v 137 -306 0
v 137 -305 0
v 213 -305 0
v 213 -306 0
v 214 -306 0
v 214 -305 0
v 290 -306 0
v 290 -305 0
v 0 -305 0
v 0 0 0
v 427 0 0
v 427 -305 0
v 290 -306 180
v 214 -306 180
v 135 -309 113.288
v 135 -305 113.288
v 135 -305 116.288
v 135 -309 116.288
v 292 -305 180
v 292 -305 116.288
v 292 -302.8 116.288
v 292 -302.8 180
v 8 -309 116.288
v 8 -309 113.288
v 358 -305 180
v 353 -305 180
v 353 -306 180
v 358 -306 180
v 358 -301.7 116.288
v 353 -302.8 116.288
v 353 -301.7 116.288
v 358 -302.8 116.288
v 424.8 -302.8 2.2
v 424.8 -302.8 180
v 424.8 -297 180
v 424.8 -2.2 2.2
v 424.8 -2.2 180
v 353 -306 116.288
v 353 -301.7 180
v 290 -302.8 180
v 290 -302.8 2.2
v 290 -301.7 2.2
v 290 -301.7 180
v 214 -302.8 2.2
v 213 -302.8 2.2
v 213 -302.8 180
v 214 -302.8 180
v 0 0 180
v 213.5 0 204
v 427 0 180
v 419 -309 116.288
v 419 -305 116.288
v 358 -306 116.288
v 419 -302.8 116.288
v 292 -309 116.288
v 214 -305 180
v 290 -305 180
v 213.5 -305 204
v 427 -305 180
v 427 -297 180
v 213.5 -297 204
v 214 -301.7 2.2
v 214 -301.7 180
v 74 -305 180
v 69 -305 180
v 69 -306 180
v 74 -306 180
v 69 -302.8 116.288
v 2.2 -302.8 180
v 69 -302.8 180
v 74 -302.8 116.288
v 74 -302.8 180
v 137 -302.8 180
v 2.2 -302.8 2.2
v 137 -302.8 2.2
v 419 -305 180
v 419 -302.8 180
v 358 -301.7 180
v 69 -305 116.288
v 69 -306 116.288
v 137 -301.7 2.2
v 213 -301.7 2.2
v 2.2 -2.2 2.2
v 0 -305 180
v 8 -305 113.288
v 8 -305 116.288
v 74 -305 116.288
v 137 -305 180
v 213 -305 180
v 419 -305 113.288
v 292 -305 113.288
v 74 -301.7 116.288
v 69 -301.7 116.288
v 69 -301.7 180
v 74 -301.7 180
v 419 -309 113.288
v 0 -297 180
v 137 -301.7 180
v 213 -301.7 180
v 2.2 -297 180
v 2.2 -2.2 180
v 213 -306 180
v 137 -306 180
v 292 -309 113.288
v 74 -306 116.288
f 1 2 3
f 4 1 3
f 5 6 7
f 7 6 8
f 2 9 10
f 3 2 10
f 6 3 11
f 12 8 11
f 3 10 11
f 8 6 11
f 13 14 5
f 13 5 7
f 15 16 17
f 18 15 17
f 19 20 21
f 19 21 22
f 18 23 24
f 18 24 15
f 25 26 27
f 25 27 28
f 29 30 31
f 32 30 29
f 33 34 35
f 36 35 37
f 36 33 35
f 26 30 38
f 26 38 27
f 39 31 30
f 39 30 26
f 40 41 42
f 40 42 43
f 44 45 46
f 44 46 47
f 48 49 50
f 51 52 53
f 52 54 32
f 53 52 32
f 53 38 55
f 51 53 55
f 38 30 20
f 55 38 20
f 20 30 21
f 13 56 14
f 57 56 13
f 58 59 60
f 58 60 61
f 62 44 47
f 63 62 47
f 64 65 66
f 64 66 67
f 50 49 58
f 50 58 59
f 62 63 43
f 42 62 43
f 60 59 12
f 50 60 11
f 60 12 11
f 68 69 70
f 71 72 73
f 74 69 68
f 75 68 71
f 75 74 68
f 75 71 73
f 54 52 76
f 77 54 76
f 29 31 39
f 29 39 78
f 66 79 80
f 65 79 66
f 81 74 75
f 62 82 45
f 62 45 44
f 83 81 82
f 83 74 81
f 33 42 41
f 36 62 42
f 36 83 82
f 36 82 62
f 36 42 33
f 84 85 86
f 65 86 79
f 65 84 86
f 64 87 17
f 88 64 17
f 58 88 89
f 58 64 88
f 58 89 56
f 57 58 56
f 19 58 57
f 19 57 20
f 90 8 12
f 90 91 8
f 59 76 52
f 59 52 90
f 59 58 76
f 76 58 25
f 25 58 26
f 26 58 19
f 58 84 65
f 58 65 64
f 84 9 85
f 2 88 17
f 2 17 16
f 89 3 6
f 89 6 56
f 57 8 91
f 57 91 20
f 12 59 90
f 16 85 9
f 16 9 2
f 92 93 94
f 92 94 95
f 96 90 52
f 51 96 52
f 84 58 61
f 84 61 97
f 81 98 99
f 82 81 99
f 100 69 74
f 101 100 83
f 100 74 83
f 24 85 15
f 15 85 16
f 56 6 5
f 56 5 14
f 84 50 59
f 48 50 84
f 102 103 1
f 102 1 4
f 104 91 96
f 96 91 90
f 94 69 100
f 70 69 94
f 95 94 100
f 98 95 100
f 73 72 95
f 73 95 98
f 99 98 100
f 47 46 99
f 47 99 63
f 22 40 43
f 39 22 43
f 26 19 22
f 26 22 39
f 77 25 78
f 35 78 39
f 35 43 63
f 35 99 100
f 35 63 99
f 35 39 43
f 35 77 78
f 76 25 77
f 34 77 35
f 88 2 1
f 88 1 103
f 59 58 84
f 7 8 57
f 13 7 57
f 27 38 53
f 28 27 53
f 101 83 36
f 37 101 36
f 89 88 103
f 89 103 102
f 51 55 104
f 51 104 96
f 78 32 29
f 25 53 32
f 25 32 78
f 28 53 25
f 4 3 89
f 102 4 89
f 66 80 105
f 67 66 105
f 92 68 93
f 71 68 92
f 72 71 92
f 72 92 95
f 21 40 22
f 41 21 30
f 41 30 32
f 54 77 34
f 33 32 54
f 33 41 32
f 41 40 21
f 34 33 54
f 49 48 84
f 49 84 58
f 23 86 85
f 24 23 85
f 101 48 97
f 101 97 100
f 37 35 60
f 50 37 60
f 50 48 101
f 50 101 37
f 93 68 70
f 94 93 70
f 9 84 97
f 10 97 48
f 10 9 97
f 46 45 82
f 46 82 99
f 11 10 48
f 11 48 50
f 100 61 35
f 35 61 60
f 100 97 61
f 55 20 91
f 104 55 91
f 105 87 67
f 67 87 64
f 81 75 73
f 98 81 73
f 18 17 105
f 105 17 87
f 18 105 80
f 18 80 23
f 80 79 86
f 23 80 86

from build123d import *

# Parameters (mm, degrees)
F0_W          = 427
F0_H          = 305
F0_W_2        = 422.6
F0_H_2        = 300.6
F1_DEPTH      = 180
F2_DEPTH      = 2.2
F3_W          = 76
F3_H          = 180
F3_W_2        = 5
F3_H_2        = 63.7124854326
F4_DEPTH      = 1
F4_DEPTH_BACK = 3.3
F3_W_3        = 61
F5_DEPTH      = 25
F6_DEPTH      = 8
F7_DEPTH      = 4
F9_DEPTH      = 305


# Not quite as in the source:
# - a feature names something its author has since deleted; it is built from what else it names
# - the program builds the solid bodies; features that only make, move or delete a surface that nothing else refers to are left out


with BuildPart() as f1:
    # F0 (on Top) → F1 (new body)
    with BuildSketch(Plane.XY):
        with Locations((213.5, -152.5)):
            Rectangle(F0_W, F0_H)
        with Locations((213.5, -152.5)):
            Rectangle(F0_W_2, F0_H_2, mode=Mode.SUBTRACT)
    extrude(amount=F1_DEPTH)

    # F0 (on Top) → F2 (join)
    with BuildSketch(Plane.XY):
        with Locations((213.5, -152.5)):
            Rectangle(F0_W_2, F0_H_2)
    extrude(amount=F2_DEPTH)

    # F3 (on face) → F4 (join, two sides)
    with BuildSketch(Plane.XZ.offset(305)) as f4_sk:
        with Locations((175, 90)):
            Rectangle(F3_W, F3_H)
        with Locations((252, 90)):
            Rectangle(F3_W, F3_H)
        with Locations((71.5, 148.1437572837)):
            Rectangle(F3_W_2, F3_H_2)
        with Locations((355.5, 148.1437572837)):
            Rectangle(F3_W_2, F3_H_2)
    extrude(amount=F4_DEPTH)
    extrude(f4_sk.sketch, amount=-F4_DEPTH_BACK)

    # F3 (on face) → F5 (cut)
    with BuildSketch(Plane.XZ.offset(305)):
        Polygon((135, 180), (137, 180), (213, 180), (214, 180), (290, 180), (292, 180), (353, 180), (358, 180), (419, 180), (427, 180), (213.5, 204), (0, 180), (8, 180), (69, 180), (74, 180), align=None)
        with Locations((322.5, 148.1437572837)):
            Rectangle(F3_W_3, F3_H_2)
        with Locations((388.5, 148.1437572837)):
            Rectangle(F3_W_3, F3_H_2)
    extrude(amount=-F5_DEPTH, mode=Mode.SUBTRACT)

    # F3 (on face) → F6 (join)
    with BuildSketch(Plane.XZ.offset(305)):
        Polygon((135, 180), (137, 180), (213, 180), (214, 180), (290, 180), (292, 180), (353, 180), (358, 180), (419, 180), (427, 180), (213.5, 204), (0, 180), (8, 180), (69, 180), (74, 180), align=None)
    extrude(amount=-F6_DEPTH)

    # F3 (on face) → F7 (join)
    with BuildSketch(Plane.XZ.offset(305)):
        Polygon((353, 116.2875145674), (292, 116.2875145674), (292, 113.2875145674), (419, 113.2875145674), (419, 116.2875145674), (358, 116.2875145674), align=None)
        Polygon((135, 113.2875145674), (135, 116.2875145674), (74, 116.2875145674), (69, 116.2875145674), (8, 116.2875145674), (8, 113.2875145674), align=None)
    extrude(amount=F7_DEPTH)


with BuildPart() as f9:
    # F8 (on face) → F9 (new body)
    with BuildSketch(Plane(origin=(0, 0, 0), x_dir=(-1, 0, 0), z_dir=(0, 1, 0))):
        Polygon((-213.5, 204), (-427, 180), (0, 180), align=None)
    extrude(amount=-F9_DEPTH)


solid = Compound([f1.part, f9.part])
